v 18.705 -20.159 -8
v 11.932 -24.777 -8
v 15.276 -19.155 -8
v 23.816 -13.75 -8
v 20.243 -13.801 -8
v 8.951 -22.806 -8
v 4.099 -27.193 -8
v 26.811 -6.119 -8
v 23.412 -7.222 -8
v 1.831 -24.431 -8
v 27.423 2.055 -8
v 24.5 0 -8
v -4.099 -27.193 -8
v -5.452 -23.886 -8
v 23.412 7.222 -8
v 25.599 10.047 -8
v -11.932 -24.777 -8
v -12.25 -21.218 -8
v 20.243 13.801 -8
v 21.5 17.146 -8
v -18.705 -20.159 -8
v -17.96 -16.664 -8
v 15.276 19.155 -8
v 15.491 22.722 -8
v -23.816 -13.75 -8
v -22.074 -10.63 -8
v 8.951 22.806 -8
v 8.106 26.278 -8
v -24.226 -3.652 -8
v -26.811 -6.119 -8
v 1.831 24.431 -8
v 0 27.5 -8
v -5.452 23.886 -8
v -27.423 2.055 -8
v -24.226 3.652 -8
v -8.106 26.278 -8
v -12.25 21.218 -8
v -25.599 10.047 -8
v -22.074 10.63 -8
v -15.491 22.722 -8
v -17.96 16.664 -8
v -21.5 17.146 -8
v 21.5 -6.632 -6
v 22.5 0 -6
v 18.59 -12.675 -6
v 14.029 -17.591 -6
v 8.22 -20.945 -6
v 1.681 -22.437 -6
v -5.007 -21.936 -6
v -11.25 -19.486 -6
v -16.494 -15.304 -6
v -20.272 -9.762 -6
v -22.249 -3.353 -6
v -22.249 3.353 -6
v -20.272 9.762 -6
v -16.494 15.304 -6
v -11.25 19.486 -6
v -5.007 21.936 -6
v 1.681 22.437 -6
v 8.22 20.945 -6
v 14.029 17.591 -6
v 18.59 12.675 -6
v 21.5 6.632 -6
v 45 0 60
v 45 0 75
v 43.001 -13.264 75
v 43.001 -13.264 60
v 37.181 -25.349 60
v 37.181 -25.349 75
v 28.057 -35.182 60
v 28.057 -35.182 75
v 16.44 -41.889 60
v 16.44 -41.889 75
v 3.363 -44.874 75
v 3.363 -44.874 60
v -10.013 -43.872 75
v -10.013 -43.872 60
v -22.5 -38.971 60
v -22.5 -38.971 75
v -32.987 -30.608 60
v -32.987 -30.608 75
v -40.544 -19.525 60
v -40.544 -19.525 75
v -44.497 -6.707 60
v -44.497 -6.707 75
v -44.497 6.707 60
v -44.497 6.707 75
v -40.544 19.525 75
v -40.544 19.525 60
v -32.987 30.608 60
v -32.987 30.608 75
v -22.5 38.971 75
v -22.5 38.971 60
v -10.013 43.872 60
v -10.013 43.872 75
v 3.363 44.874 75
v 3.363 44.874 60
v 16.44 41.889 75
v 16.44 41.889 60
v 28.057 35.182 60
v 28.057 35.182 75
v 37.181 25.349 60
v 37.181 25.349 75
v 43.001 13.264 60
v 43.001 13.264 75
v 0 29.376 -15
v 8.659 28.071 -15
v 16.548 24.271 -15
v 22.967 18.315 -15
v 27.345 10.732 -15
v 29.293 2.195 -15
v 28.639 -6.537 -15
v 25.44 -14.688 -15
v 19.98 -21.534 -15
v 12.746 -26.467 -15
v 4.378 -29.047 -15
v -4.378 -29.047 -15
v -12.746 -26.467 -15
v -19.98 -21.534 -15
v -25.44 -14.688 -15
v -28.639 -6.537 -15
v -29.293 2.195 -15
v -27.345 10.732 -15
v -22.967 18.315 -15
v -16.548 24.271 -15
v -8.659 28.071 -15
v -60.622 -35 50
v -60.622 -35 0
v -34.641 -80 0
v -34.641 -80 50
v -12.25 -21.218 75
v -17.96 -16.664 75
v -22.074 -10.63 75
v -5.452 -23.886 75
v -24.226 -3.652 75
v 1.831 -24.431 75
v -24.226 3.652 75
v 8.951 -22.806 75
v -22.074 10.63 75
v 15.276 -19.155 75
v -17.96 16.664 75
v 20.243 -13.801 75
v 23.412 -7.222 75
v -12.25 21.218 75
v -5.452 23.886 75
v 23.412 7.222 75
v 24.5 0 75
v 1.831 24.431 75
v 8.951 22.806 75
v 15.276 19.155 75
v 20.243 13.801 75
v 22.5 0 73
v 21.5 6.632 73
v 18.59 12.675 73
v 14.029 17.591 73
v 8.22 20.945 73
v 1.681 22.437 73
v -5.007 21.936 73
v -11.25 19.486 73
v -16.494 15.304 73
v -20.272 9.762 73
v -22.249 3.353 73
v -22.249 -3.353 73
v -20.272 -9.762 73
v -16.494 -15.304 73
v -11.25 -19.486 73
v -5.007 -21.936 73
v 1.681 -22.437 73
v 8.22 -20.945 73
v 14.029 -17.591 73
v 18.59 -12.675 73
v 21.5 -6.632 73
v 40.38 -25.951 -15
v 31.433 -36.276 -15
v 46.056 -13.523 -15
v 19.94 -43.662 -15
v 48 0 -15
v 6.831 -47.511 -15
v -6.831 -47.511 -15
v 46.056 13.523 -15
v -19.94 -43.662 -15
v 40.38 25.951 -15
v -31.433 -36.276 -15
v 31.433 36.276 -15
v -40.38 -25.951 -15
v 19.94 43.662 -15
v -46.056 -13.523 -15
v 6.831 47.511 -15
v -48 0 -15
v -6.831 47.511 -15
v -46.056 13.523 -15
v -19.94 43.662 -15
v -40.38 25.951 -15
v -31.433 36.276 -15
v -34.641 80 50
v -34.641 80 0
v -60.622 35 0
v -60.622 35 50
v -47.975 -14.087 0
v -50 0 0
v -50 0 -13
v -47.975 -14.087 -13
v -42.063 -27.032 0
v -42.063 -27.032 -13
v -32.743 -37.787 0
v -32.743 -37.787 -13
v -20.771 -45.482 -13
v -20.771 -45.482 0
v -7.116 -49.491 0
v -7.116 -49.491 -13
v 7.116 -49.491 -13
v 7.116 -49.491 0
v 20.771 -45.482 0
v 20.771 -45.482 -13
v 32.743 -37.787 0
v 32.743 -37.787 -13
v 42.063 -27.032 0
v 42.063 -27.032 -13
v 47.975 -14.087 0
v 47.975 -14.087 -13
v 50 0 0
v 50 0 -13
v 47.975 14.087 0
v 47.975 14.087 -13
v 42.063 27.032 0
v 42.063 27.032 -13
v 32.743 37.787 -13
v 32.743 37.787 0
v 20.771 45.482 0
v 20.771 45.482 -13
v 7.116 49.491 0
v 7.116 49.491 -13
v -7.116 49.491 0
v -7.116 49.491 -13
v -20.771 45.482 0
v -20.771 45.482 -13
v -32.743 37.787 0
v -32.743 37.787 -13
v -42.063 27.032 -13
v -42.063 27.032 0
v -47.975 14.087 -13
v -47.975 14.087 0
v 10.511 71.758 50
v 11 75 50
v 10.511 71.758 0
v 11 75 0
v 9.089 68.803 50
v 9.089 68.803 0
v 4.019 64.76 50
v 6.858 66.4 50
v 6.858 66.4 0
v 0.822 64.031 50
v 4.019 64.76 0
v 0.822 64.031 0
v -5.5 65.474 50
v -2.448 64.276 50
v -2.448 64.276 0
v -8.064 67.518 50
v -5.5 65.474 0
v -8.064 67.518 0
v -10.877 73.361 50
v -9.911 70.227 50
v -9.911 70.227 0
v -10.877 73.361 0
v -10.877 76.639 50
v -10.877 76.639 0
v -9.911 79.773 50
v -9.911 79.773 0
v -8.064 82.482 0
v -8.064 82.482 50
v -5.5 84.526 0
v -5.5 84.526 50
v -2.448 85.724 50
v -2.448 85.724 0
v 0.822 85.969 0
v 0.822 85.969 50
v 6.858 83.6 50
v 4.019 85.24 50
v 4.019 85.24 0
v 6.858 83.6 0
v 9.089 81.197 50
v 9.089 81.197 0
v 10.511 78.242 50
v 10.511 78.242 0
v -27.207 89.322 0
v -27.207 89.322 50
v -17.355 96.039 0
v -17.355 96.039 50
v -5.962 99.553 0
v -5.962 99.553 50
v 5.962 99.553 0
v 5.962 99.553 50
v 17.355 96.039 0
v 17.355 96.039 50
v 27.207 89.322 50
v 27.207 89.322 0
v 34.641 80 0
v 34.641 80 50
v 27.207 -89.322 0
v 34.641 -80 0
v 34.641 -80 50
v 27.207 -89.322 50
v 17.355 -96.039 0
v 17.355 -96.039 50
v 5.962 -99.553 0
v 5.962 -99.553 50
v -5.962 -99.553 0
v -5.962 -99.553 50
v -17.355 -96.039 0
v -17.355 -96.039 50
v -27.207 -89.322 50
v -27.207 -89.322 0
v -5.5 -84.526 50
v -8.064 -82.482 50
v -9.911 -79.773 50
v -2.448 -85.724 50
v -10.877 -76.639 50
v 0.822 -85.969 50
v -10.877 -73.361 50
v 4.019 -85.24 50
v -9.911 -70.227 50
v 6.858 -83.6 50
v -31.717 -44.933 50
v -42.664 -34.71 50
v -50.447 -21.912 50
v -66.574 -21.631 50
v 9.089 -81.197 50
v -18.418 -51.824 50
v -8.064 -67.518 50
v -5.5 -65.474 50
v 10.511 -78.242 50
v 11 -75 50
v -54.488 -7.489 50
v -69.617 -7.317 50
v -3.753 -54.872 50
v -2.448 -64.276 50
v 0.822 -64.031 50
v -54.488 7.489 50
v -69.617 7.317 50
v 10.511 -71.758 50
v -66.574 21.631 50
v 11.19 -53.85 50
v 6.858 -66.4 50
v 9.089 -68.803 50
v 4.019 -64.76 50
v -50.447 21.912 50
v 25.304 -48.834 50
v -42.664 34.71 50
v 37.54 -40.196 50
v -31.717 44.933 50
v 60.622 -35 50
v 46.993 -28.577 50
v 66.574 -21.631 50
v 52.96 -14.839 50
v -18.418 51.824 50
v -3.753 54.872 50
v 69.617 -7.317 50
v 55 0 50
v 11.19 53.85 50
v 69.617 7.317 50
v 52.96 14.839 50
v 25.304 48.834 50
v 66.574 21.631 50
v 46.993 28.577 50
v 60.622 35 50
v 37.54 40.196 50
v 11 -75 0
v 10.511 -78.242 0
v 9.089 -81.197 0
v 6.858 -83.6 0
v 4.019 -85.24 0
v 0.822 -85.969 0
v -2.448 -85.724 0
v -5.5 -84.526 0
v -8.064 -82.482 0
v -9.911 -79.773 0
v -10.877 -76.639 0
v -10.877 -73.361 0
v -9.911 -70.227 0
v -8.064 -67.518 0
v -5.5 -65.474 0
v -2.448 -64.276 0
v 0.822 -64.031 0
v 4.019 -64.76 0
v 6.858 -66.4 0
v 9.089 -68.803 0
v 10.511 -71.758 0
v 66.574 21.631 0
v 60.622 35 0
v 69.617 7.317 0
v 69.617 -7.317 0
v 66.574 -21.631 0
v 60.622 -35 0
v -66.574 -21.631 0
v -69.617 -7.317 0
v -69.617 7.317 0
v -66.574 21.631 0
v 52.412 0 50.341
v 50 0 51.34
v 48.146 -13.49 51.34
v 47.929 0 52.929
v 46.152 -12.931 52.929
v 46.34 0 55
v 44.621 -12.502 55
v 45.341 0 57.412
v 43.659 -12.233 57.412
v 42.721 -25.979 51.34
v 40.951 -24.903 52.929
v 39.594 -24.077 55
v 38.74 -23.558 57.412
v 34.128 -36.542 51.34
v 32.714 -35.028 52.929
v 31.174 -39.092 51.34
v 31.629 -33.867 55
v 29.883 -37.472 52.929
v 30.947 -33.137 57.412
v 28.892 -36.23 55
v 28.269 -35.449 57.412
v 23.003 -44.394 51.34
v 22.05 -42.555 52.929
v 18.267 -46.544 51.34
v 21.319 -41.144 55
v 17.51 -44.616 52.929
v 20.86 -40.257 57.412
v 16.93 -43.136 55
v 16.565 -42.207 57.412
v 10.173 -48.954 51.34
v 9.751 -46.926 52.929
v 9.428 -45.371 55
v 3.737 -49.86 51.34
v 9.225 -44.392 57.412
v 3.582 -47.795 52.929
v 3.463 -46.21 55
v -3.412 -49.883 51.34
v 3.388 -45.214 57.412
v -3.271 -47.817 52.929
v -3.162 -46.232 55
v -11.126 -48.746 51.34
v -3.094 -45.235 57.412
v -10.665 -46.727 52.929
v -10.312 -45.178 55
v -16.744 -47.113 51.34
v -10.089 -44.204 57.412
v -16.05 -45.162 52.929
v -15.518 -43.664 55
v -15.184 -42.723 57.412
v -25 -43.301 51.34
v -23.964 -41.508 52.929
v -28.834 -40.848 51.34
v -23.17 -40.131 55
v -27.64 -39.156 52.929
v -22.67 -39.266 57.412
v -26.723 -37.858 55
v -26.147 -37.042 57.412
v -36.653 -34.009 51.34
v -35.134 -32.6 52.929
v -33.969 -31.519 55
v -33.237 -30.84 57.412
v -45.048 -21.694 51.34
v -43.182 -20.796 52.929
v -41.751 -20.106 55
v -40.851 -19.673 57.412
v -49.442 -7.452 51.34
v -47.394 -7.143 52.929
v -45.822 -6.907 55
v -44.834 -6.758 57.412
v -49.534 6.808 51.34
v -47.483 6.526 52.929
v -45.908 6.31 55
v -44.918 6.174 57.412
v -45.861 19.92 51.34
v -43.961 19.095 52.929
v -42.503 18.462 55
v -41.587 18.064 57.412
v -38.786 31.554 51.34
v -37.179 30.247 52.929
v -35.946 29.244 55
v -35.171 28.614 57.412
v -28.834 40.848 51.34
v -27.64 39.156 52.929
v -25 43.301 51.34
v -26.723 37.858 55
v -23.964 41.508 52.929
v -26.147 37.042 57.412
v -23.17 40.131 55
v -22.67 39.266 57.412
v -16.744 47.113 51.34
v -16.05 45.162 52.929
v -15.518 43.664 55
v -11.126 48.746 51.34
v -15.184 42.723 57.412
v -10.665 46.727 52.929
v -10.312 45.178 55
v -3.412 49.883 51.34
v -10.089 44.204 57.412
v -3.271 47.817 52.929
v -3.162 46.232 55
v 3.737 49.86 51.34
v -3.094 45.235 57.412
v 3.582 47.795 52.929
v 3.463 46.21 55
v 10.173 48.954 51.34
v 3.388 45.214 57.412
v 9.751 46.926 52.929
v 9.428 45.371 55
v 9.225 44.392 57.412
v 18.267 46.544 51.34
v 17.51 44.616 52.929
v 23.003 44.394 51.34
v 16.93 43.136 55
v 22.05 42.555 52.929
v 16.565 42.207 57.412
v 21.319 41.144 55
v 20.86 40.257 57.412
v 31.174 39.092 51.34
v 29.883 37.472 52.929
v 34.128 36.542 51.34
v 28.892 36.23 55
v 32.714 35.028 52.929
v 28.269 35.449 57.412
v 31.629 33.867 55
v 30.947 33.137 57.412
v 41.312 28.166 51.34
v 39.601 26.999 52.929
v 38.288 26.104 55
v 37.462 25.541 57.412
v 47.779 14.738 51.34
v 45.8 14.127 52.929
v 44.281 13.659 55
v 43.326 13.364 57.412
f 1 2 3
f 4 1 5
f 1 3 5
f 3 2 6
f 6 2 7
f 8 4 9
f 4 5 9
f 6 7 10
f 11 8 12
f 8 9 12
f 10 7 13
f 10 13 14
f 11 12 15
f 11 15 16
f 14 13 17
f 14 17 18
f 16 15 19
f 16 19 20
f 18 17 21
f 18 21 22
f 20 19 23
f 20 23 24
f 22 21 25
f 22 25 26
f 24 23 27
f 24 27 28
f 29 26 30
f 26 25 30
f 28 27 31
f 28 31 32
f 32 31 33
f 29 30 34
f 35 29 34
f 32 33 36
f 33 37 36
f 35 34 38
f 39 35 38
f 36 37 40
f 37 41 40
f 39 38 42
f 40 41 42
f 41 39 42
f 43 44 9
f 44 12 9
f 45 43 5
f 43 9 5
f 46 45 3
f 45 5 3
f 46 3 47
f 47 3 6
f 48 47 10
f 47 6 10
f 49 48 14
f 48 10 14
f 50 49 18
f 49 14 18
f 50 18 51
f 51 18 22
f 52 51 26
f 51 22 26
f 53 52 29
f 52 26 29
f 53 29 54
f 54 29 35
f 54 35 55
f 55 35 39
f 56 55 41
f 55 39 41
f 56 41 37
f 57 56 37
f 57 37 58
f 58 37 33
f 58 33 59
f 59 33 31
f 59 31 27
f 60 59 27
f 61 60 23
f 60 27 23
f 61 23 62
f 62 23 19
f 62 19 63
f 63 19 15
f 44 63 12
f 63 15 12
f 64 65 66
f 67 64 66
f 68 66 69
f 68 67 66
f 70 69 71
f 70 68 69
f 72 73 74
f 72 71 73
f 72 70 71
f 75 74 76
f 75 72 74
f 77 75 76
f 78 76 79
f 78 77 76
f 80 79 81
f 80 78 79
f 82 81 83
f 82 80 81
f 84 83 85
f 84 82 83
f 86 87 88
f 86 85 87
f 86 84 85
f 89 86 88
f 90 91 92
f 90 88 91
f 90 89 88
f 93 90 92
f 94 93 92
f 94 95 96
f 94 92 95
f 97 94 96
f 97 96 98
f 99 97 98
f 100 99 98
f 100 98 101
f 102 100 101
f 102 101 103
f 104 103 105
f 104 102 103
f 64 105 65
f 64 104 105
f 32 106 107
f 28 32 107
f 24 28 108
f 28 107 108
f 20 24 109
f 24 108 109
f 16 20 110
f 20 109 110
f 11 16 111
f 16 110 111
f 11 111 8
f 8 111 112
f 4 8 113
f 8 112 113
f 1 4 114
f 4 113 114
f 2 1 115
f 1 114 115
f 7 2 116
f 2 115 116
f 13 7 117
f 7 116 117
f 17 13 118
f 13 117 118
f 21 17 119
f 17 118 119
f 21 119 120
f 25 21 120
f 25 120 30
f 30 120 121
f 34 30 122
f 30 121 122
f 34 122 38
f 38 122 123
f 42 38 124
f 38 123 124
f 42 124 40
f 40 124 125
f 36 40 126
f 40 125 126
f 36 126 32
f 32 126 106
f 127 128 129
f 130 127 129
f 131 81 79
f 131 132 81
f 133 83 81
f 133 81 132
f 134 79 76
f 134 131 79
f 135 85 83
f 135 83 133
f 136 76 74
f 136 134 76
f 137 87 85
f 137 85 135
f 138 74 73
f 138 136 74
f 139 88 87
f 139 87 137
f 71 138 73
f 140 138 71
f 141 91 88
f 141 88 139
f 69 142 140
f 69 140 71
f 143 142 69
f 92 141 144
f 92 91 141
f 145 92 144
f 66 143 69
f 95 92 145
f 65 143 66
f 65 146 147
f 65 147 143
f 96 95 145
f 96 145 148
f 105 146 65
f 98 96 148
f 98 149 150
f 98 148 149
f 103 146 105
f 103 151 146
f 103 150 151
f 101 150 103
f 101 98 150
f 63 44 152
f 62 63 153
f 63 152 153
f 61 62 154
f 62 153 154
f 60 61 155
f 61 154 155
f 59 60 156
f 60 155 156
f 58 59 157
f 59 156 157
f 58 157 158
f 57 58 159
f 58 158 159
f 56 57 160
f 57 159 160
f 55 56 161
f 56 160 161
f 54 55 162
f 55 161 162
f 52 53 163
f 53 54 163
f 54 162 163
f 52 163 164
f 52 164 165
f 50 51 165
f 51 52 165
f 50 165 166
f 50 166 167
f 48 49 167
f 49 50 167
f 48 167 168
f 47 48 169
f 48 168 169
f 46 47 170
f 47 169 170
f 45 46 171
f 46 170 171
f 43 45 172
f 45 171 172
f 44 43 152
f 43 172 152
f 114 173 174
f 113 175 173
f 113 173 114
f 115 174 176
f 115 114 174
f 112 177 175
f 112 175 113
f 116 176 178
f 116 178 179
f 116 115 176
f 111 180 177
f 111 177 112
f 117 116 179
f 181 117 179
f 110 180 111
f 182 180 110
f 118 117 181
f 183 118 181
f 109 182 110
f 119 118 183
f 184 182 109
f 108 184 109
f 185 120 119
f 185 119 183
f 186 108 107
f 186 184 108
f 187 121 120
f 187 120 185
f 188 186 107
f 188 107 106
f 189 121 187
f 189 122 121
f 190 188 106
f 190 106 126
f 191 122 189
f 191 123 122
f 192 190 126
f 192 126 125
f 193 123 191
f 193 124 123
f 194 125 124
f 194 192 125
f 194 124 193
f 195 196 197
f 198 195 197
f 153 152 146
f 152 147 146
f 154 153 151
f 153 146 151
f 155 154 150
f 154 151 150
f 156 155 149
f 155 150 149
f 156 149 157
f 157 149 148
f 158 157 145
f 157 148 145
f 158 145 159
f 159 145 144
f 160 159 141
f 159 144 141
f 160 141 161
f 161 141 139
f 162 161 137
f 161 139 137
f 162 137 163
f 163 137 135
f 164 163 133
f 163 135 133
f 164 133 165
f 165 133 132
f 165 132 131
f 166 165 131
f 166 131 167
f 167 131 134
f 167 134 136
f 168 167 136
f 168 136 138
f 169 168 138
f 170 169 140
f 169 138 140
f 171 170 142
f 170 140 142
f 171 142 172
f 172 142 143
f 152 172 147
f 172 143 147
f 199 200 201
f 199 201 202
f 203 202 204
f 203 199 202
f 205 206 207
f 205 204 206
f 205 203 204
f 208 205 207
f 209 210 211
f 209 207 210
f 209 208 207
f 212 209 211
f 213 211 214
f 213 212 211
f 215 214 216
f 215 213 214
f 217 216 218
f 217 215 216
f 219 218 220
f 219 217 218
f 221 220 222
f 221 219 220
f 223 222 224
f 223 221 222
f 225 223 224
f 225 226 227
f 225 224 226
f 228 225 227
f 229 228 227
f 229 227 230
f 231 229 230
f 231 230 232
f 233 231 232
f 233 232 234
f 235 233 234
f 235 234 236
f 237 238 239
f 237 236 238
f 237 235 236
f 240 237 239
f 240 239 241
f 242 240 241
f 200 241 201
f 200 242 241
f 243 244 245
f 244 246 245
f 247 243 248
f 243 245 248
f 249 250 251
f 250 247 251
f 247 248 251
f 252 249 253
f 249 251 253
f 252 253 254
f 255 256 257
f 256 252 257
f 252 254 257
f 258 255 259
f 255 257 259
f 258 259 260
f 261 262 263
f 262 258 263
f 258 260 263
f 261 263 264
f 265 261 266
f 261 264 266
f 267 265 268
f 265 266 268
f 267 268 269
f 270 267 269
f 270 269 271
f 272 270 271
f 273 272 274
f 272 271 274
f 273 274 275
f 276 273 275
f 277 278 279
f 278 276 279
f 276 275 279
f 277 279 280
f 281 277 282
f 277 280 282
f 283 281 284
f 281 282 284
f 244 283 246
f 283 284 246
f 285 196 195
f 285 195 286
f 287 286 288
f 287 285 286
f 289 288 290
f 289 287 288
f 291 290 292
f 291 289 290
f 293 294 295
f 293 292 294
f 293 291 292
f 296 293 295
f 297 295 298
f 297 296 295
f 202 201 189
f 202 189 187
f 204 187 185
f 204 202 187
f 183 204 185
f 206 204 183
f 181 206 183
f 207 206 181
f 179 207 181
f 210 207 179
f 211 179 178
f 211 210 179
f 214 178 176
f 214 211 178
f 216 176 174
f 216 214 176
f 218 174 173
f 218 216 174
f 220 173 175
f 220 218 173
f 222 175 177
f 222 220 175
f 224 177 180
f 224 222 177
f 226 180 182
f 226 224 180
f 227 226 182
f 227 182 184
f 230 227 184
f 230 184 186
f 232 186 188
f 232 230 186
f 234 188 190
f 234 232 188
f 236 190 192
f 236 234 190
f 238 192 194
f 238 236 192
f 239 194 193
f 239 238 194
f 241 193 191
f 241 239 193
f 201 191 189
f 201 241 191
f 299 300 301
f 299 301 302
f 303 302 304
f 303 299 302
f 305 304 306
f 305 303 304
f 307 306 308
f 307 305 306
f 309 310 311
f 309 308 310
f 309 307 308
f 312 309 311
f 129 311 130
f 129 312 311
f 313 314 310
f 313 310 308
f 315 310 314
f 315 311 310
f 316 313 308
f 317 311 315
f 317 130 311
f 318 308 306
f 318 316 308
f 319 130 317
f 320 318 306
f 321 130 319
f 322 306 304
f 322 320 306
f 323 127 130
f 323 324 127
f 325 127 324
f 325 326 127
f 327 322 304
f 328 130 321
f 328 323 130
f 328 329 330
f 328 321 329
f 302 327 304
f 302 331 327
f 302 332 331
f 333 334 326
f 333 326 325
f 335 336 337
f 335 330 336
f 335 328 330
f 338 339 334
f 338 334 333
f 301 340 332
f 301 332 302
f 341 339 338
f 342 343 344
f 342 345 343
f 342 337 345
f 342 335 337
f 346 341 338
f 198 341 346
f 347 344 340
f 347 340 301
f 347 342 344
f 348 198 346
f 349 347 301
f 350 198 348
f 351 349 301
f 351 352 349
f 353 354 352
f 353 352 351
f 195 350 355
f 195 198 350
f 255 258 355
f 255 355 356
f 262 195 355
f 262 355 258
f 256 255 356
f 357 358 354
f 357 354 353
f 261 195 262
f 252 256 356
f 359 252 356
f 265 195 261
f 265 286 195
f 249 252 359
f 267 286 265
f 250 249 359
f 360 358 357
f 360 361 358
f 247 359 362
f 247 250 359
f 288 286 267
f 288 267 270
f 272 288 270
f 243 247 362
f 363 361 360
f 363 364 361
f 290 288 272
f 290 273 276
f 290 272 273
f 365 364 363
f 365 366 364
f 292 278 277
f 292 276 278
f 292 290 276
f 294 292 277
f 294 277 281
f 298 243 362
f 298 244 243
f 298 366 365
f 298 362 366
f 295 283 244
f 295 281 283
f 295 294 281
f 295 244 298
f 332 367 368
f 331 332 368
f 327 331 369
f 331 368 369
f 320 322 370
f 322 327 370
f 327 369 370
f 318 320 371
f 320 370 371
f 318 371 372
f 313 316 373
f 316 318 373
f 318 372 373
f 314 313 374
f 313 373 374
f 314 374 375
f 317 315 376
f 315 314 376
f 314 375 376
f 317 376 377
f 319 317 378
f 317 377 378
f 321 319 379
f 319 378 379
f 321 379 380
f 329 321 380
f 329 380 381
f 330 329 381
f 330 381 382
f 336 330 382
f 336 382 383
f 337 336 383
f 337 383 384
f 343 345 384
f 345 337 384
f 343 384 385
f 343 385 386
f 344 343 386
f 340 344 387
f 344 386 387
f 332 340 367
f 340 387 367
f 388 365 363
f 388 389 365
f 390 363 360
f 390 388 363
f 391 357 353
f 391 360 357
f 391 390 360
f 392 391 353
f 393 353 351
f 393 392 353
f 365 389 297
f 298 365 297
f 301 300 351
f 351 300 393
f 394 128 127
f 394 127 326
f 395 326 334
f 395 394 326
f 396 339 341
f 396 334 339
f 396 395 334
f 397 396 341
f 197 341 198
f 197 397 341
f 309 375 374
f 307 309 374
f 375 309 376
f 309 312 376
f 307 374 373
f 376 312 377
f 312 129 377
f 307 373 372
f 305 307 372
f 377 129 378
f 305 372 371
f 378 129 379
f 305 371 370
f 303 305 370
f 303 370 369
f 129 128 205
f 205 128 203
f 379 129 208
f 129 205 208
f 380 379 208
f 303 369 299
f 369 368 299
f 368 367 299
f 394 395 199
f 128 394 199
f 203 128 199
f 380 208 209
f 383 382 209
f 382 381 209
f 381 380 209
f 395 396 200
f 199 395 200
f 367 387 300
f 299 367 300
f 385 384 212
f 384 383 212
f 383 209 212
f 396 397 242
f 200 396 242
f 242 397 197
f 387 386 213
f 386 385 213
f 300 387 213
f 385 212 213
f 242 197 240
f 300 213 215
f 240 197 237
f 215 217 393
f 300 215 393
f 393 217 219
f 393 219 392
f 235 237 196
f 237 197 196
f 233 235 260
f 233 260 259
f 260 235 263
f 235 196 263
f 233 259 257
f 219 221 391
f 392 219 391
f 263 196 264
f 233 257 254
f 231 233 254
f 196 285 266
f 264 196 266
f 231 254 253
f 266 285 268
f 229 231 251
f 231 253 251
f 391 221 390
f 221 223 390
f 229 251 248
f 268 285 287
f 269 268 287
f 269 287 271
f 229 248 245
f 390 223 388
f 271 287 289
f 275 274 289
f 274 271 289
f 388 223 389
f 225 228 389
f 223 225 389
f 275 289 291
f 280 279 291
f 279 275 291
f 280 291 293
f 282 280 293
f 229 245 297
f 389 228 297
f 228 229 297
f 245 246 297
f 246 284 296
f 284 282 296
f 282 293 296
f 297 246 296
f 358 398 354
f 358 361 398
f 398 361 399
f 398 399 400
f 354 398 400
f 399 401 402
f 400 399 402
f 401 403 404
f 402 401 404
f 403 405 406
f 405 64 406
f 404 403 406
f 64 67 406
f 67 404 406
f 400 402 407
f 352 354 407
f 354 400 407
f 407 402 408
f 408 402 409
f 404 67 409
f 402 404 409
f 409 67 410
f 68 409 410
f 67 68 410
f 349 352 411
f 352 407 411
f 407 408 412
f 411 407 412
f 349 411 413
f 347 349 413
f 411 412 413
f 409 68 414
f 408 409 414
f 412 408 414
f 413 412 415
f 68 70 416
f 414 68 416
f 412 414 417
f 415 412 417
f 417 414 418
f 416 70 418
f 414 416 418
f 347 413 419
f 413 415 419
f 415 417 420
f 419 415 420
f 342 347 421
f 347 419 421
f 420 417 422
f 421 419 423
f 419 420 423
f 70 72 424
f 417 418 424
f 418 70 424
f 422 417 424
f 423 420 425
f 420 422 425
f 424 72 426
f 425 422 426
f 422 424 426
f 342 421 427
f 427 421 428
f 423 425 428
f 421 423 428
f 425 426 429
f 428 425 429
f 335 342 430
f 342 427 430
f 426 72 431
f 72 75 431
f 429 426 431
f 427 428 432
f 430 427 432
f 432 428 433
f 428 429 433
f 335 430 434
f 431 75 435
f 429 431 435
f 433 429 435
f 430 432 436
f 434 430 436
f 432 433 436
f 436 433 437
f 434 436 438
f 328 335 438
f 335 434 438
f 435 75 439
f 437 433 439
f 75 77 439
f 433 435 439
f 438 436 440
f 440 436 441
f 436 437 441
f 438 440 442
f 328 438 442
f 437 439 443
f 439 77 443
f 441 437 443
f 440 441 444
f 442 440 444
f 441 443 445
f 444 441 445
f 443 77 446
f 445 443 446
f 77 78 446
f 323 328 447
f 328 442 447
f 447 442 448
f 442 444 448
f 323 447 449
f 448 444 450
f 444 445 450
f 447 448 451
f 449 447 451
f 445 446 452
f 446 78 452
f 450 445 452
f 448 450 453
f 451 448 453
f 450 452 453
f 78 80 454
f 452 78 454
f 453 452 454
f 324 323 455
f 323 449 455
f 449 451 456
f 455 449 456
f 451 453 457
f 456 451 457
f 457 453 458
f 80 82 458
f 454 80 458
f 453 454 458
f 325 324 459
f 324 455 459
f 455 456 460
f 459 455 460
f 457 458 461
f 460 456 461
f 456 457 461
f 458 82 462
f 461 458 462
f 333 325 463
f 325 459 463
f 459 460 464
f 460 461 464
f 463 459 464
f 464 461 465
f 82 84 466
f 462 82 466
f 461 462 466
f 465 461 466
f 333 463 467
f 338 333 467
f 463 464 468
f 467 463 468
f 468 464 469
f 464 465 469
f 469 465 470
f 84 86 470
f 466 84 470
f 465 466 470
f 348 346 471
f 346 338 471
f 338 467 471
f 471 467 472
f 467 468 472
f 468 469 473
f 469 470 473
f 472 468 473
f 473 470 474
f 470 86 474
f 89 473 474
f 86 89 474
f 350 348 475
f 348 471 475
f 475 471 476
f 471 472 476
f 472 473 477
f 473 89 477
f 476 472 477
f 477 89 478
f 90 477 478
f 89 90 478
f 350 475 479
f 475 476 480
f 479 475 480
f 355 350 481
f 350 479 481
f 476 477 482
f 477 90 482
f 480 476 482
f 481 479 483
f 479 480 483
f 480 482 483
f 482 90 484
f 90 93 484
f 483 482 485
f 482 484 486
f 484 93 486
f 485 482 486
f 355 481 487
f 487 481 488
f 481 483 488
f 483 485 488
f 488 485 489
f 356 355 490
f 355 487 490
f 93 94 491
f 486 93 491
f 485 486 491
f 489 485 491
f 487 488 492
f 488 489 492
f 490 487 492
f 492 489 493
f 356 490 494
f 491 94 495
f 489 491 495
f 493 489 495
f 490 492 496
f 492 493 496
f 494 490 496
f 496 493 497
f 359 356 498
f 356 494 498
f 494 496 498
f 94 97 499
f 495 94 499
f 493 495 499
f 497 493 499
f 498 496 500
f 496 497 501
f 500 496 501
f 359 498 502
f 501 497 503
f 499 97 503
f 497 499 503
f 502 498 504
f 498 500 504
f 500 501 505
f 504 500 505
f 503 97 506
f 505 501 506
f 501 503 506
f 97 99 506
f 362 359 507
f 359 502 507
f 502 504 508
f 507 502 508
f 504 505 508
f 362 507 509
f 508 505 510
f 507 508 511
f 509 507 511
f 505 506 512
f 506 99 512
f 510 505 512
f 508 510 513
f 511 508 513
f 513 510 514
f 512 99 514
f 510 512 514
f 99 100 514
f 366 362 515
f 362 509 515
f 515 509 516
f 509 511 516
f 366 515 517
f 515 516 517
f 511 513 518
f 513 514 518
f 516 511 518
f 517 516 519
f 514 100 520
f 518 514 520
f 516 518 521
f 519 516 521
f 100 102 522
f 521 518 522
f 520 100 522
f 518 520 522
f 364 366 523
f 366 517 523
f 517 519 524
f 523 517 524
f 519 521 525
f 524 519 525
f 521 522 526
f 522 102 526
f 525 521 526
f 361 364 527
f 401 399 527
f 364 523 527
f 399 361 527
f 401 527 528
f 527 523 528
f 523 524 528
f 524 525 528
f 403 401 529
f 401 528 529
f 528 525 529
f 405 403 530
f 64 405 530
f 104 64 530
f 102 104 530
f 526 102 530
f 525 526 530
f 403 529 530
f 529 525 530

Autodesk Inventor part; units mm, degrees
ref_plane "YZ Plane" through (0, 0, 0) normal (1, 0, 0) x (0, 1, 0)
ref_plane "XZ Plane" through (0, 0, 0) normal (0, 1, 0) x (-1, 0, 0)
ref_plane "XY Plane" through (0, 0, 0) normal (0, 0, 1) x (1, 0, 0)
ref_plane "РабПлоскость1" through (0, 0, 0) normal (0, 0, 1) x (1, 0, 0)
sketch "Эскиз1" plane through (0, 0, 0) normal (0, 0, 1) x (1, 0, 0)
  circle A0 centre (0, 75) radius 8 projected
  circle A1 centre (0, -75) radius 8 projected
  line L0 (34.641, -80) -> (60.6218, -35) projected
  arc A2 (60.6218, -35) -> (60.6218, 35) centre (0, 0) ccw projected
  line L1 (60.6218, 35) -> (34.641, 80) projected
  arc A3 (34.641, 80) -> (-34.641, 80) centre (0, 60) ccw projected
  line L2 (-34.641, 80) -> (-60.6218, 35) projected
  arc A4 (-60.6218, 35) -> (-60.6218, -35) centre (0, 0) ccw projected
  line L3 (-60.6218, -35) -> (-34.641, -80) projected
  arc A5 (-34.641, -80) -> (34.641, -80) centre (0, -60) ccw projected
  circle A6 centre (0, 0) radius 50 projected
  circle A7 centre (0, 75) radius 11
  circle A8 centre (0, -75) radius 11
  point P0 (0, 0)
  dimension "d22" = 22
  dimension "d23" = 22
extrude "Выдавливание1" add sketch "Эскиз1" along normal blind 50 contours A5 L3 A4 L2 A3 L1 A2 L0 | A6
sketch "Эскиз2" plane through (0, 0, 0) normal (0, 0, -1) x (-1, 0, 0)
  circle A0 centre (0, 0) radius 50
  dimension "d2" = 100
extrude "Выдавливание2" add sketch "Эскиз2" along normal blind 15
sketch "Эскиз3" plane through (0, 0, 50) normal (0, 0, 1) x (1, 0, 0)
  circle A0 centre (0, 0) radius 45
  dimension "d5" = 90
extrude "Выдавливание3" add sketch "Эскиз3" along normal blind 25
fillet "Сопряжение1" radius 10 1 edges at (-45, 0, 50)
sketch "Эскиз4" plane through (0, 0, 75) normal (0, 0, 1) x (1, 0, 0)
  circle A0 centre (0, 0) radius 55 projected
  circle A1 centre (0, 0) radius 22.5
  dimension "d9" = 45
extrude "Выдавливание4" cut sketch "Эскиз4" against normal through all contours A1
chamfer "Фаска1" distance 2 angle 45 3 edges at (-22.5, 0, 75) (50, 0, -15) (-22.5, 0, -15)
sketch "Эскиз5" plane through (0, 0, 0) normal (1, 0, 0) x (0, 1, 0)
  line L0 (-24.5, -15) -> (24.5, -15) projected
  line L1 (48, -15) -> (-48, -15) projected
  line L2 (22.5, 73) -> (22.5, -13) projected
  line L3 (22.5, -15) -> (22.5, -8)
  line L4 (22.5, -8) -> (27.5, -8)
  line L5 (27.5, -8) -> (29.3756, -15)
  line L6 (0, -32.6) -> (0, 90.6) projected
  point P0 (0, 0)
  dimension "d15" = 7
  dimension "d16" = 5
  dimension "d17" = 105
revolve "Вращение1" cut sketch "Эскиз5" angle 360 about axis through (0, 0, -10) along (0, 0, 1)
chamfer "Фаска2" distance 2 angle 45 1 edges at (-22.5, 0, -8)
properties part number "Фланецгайка" material "Сталь, углеродистая"
